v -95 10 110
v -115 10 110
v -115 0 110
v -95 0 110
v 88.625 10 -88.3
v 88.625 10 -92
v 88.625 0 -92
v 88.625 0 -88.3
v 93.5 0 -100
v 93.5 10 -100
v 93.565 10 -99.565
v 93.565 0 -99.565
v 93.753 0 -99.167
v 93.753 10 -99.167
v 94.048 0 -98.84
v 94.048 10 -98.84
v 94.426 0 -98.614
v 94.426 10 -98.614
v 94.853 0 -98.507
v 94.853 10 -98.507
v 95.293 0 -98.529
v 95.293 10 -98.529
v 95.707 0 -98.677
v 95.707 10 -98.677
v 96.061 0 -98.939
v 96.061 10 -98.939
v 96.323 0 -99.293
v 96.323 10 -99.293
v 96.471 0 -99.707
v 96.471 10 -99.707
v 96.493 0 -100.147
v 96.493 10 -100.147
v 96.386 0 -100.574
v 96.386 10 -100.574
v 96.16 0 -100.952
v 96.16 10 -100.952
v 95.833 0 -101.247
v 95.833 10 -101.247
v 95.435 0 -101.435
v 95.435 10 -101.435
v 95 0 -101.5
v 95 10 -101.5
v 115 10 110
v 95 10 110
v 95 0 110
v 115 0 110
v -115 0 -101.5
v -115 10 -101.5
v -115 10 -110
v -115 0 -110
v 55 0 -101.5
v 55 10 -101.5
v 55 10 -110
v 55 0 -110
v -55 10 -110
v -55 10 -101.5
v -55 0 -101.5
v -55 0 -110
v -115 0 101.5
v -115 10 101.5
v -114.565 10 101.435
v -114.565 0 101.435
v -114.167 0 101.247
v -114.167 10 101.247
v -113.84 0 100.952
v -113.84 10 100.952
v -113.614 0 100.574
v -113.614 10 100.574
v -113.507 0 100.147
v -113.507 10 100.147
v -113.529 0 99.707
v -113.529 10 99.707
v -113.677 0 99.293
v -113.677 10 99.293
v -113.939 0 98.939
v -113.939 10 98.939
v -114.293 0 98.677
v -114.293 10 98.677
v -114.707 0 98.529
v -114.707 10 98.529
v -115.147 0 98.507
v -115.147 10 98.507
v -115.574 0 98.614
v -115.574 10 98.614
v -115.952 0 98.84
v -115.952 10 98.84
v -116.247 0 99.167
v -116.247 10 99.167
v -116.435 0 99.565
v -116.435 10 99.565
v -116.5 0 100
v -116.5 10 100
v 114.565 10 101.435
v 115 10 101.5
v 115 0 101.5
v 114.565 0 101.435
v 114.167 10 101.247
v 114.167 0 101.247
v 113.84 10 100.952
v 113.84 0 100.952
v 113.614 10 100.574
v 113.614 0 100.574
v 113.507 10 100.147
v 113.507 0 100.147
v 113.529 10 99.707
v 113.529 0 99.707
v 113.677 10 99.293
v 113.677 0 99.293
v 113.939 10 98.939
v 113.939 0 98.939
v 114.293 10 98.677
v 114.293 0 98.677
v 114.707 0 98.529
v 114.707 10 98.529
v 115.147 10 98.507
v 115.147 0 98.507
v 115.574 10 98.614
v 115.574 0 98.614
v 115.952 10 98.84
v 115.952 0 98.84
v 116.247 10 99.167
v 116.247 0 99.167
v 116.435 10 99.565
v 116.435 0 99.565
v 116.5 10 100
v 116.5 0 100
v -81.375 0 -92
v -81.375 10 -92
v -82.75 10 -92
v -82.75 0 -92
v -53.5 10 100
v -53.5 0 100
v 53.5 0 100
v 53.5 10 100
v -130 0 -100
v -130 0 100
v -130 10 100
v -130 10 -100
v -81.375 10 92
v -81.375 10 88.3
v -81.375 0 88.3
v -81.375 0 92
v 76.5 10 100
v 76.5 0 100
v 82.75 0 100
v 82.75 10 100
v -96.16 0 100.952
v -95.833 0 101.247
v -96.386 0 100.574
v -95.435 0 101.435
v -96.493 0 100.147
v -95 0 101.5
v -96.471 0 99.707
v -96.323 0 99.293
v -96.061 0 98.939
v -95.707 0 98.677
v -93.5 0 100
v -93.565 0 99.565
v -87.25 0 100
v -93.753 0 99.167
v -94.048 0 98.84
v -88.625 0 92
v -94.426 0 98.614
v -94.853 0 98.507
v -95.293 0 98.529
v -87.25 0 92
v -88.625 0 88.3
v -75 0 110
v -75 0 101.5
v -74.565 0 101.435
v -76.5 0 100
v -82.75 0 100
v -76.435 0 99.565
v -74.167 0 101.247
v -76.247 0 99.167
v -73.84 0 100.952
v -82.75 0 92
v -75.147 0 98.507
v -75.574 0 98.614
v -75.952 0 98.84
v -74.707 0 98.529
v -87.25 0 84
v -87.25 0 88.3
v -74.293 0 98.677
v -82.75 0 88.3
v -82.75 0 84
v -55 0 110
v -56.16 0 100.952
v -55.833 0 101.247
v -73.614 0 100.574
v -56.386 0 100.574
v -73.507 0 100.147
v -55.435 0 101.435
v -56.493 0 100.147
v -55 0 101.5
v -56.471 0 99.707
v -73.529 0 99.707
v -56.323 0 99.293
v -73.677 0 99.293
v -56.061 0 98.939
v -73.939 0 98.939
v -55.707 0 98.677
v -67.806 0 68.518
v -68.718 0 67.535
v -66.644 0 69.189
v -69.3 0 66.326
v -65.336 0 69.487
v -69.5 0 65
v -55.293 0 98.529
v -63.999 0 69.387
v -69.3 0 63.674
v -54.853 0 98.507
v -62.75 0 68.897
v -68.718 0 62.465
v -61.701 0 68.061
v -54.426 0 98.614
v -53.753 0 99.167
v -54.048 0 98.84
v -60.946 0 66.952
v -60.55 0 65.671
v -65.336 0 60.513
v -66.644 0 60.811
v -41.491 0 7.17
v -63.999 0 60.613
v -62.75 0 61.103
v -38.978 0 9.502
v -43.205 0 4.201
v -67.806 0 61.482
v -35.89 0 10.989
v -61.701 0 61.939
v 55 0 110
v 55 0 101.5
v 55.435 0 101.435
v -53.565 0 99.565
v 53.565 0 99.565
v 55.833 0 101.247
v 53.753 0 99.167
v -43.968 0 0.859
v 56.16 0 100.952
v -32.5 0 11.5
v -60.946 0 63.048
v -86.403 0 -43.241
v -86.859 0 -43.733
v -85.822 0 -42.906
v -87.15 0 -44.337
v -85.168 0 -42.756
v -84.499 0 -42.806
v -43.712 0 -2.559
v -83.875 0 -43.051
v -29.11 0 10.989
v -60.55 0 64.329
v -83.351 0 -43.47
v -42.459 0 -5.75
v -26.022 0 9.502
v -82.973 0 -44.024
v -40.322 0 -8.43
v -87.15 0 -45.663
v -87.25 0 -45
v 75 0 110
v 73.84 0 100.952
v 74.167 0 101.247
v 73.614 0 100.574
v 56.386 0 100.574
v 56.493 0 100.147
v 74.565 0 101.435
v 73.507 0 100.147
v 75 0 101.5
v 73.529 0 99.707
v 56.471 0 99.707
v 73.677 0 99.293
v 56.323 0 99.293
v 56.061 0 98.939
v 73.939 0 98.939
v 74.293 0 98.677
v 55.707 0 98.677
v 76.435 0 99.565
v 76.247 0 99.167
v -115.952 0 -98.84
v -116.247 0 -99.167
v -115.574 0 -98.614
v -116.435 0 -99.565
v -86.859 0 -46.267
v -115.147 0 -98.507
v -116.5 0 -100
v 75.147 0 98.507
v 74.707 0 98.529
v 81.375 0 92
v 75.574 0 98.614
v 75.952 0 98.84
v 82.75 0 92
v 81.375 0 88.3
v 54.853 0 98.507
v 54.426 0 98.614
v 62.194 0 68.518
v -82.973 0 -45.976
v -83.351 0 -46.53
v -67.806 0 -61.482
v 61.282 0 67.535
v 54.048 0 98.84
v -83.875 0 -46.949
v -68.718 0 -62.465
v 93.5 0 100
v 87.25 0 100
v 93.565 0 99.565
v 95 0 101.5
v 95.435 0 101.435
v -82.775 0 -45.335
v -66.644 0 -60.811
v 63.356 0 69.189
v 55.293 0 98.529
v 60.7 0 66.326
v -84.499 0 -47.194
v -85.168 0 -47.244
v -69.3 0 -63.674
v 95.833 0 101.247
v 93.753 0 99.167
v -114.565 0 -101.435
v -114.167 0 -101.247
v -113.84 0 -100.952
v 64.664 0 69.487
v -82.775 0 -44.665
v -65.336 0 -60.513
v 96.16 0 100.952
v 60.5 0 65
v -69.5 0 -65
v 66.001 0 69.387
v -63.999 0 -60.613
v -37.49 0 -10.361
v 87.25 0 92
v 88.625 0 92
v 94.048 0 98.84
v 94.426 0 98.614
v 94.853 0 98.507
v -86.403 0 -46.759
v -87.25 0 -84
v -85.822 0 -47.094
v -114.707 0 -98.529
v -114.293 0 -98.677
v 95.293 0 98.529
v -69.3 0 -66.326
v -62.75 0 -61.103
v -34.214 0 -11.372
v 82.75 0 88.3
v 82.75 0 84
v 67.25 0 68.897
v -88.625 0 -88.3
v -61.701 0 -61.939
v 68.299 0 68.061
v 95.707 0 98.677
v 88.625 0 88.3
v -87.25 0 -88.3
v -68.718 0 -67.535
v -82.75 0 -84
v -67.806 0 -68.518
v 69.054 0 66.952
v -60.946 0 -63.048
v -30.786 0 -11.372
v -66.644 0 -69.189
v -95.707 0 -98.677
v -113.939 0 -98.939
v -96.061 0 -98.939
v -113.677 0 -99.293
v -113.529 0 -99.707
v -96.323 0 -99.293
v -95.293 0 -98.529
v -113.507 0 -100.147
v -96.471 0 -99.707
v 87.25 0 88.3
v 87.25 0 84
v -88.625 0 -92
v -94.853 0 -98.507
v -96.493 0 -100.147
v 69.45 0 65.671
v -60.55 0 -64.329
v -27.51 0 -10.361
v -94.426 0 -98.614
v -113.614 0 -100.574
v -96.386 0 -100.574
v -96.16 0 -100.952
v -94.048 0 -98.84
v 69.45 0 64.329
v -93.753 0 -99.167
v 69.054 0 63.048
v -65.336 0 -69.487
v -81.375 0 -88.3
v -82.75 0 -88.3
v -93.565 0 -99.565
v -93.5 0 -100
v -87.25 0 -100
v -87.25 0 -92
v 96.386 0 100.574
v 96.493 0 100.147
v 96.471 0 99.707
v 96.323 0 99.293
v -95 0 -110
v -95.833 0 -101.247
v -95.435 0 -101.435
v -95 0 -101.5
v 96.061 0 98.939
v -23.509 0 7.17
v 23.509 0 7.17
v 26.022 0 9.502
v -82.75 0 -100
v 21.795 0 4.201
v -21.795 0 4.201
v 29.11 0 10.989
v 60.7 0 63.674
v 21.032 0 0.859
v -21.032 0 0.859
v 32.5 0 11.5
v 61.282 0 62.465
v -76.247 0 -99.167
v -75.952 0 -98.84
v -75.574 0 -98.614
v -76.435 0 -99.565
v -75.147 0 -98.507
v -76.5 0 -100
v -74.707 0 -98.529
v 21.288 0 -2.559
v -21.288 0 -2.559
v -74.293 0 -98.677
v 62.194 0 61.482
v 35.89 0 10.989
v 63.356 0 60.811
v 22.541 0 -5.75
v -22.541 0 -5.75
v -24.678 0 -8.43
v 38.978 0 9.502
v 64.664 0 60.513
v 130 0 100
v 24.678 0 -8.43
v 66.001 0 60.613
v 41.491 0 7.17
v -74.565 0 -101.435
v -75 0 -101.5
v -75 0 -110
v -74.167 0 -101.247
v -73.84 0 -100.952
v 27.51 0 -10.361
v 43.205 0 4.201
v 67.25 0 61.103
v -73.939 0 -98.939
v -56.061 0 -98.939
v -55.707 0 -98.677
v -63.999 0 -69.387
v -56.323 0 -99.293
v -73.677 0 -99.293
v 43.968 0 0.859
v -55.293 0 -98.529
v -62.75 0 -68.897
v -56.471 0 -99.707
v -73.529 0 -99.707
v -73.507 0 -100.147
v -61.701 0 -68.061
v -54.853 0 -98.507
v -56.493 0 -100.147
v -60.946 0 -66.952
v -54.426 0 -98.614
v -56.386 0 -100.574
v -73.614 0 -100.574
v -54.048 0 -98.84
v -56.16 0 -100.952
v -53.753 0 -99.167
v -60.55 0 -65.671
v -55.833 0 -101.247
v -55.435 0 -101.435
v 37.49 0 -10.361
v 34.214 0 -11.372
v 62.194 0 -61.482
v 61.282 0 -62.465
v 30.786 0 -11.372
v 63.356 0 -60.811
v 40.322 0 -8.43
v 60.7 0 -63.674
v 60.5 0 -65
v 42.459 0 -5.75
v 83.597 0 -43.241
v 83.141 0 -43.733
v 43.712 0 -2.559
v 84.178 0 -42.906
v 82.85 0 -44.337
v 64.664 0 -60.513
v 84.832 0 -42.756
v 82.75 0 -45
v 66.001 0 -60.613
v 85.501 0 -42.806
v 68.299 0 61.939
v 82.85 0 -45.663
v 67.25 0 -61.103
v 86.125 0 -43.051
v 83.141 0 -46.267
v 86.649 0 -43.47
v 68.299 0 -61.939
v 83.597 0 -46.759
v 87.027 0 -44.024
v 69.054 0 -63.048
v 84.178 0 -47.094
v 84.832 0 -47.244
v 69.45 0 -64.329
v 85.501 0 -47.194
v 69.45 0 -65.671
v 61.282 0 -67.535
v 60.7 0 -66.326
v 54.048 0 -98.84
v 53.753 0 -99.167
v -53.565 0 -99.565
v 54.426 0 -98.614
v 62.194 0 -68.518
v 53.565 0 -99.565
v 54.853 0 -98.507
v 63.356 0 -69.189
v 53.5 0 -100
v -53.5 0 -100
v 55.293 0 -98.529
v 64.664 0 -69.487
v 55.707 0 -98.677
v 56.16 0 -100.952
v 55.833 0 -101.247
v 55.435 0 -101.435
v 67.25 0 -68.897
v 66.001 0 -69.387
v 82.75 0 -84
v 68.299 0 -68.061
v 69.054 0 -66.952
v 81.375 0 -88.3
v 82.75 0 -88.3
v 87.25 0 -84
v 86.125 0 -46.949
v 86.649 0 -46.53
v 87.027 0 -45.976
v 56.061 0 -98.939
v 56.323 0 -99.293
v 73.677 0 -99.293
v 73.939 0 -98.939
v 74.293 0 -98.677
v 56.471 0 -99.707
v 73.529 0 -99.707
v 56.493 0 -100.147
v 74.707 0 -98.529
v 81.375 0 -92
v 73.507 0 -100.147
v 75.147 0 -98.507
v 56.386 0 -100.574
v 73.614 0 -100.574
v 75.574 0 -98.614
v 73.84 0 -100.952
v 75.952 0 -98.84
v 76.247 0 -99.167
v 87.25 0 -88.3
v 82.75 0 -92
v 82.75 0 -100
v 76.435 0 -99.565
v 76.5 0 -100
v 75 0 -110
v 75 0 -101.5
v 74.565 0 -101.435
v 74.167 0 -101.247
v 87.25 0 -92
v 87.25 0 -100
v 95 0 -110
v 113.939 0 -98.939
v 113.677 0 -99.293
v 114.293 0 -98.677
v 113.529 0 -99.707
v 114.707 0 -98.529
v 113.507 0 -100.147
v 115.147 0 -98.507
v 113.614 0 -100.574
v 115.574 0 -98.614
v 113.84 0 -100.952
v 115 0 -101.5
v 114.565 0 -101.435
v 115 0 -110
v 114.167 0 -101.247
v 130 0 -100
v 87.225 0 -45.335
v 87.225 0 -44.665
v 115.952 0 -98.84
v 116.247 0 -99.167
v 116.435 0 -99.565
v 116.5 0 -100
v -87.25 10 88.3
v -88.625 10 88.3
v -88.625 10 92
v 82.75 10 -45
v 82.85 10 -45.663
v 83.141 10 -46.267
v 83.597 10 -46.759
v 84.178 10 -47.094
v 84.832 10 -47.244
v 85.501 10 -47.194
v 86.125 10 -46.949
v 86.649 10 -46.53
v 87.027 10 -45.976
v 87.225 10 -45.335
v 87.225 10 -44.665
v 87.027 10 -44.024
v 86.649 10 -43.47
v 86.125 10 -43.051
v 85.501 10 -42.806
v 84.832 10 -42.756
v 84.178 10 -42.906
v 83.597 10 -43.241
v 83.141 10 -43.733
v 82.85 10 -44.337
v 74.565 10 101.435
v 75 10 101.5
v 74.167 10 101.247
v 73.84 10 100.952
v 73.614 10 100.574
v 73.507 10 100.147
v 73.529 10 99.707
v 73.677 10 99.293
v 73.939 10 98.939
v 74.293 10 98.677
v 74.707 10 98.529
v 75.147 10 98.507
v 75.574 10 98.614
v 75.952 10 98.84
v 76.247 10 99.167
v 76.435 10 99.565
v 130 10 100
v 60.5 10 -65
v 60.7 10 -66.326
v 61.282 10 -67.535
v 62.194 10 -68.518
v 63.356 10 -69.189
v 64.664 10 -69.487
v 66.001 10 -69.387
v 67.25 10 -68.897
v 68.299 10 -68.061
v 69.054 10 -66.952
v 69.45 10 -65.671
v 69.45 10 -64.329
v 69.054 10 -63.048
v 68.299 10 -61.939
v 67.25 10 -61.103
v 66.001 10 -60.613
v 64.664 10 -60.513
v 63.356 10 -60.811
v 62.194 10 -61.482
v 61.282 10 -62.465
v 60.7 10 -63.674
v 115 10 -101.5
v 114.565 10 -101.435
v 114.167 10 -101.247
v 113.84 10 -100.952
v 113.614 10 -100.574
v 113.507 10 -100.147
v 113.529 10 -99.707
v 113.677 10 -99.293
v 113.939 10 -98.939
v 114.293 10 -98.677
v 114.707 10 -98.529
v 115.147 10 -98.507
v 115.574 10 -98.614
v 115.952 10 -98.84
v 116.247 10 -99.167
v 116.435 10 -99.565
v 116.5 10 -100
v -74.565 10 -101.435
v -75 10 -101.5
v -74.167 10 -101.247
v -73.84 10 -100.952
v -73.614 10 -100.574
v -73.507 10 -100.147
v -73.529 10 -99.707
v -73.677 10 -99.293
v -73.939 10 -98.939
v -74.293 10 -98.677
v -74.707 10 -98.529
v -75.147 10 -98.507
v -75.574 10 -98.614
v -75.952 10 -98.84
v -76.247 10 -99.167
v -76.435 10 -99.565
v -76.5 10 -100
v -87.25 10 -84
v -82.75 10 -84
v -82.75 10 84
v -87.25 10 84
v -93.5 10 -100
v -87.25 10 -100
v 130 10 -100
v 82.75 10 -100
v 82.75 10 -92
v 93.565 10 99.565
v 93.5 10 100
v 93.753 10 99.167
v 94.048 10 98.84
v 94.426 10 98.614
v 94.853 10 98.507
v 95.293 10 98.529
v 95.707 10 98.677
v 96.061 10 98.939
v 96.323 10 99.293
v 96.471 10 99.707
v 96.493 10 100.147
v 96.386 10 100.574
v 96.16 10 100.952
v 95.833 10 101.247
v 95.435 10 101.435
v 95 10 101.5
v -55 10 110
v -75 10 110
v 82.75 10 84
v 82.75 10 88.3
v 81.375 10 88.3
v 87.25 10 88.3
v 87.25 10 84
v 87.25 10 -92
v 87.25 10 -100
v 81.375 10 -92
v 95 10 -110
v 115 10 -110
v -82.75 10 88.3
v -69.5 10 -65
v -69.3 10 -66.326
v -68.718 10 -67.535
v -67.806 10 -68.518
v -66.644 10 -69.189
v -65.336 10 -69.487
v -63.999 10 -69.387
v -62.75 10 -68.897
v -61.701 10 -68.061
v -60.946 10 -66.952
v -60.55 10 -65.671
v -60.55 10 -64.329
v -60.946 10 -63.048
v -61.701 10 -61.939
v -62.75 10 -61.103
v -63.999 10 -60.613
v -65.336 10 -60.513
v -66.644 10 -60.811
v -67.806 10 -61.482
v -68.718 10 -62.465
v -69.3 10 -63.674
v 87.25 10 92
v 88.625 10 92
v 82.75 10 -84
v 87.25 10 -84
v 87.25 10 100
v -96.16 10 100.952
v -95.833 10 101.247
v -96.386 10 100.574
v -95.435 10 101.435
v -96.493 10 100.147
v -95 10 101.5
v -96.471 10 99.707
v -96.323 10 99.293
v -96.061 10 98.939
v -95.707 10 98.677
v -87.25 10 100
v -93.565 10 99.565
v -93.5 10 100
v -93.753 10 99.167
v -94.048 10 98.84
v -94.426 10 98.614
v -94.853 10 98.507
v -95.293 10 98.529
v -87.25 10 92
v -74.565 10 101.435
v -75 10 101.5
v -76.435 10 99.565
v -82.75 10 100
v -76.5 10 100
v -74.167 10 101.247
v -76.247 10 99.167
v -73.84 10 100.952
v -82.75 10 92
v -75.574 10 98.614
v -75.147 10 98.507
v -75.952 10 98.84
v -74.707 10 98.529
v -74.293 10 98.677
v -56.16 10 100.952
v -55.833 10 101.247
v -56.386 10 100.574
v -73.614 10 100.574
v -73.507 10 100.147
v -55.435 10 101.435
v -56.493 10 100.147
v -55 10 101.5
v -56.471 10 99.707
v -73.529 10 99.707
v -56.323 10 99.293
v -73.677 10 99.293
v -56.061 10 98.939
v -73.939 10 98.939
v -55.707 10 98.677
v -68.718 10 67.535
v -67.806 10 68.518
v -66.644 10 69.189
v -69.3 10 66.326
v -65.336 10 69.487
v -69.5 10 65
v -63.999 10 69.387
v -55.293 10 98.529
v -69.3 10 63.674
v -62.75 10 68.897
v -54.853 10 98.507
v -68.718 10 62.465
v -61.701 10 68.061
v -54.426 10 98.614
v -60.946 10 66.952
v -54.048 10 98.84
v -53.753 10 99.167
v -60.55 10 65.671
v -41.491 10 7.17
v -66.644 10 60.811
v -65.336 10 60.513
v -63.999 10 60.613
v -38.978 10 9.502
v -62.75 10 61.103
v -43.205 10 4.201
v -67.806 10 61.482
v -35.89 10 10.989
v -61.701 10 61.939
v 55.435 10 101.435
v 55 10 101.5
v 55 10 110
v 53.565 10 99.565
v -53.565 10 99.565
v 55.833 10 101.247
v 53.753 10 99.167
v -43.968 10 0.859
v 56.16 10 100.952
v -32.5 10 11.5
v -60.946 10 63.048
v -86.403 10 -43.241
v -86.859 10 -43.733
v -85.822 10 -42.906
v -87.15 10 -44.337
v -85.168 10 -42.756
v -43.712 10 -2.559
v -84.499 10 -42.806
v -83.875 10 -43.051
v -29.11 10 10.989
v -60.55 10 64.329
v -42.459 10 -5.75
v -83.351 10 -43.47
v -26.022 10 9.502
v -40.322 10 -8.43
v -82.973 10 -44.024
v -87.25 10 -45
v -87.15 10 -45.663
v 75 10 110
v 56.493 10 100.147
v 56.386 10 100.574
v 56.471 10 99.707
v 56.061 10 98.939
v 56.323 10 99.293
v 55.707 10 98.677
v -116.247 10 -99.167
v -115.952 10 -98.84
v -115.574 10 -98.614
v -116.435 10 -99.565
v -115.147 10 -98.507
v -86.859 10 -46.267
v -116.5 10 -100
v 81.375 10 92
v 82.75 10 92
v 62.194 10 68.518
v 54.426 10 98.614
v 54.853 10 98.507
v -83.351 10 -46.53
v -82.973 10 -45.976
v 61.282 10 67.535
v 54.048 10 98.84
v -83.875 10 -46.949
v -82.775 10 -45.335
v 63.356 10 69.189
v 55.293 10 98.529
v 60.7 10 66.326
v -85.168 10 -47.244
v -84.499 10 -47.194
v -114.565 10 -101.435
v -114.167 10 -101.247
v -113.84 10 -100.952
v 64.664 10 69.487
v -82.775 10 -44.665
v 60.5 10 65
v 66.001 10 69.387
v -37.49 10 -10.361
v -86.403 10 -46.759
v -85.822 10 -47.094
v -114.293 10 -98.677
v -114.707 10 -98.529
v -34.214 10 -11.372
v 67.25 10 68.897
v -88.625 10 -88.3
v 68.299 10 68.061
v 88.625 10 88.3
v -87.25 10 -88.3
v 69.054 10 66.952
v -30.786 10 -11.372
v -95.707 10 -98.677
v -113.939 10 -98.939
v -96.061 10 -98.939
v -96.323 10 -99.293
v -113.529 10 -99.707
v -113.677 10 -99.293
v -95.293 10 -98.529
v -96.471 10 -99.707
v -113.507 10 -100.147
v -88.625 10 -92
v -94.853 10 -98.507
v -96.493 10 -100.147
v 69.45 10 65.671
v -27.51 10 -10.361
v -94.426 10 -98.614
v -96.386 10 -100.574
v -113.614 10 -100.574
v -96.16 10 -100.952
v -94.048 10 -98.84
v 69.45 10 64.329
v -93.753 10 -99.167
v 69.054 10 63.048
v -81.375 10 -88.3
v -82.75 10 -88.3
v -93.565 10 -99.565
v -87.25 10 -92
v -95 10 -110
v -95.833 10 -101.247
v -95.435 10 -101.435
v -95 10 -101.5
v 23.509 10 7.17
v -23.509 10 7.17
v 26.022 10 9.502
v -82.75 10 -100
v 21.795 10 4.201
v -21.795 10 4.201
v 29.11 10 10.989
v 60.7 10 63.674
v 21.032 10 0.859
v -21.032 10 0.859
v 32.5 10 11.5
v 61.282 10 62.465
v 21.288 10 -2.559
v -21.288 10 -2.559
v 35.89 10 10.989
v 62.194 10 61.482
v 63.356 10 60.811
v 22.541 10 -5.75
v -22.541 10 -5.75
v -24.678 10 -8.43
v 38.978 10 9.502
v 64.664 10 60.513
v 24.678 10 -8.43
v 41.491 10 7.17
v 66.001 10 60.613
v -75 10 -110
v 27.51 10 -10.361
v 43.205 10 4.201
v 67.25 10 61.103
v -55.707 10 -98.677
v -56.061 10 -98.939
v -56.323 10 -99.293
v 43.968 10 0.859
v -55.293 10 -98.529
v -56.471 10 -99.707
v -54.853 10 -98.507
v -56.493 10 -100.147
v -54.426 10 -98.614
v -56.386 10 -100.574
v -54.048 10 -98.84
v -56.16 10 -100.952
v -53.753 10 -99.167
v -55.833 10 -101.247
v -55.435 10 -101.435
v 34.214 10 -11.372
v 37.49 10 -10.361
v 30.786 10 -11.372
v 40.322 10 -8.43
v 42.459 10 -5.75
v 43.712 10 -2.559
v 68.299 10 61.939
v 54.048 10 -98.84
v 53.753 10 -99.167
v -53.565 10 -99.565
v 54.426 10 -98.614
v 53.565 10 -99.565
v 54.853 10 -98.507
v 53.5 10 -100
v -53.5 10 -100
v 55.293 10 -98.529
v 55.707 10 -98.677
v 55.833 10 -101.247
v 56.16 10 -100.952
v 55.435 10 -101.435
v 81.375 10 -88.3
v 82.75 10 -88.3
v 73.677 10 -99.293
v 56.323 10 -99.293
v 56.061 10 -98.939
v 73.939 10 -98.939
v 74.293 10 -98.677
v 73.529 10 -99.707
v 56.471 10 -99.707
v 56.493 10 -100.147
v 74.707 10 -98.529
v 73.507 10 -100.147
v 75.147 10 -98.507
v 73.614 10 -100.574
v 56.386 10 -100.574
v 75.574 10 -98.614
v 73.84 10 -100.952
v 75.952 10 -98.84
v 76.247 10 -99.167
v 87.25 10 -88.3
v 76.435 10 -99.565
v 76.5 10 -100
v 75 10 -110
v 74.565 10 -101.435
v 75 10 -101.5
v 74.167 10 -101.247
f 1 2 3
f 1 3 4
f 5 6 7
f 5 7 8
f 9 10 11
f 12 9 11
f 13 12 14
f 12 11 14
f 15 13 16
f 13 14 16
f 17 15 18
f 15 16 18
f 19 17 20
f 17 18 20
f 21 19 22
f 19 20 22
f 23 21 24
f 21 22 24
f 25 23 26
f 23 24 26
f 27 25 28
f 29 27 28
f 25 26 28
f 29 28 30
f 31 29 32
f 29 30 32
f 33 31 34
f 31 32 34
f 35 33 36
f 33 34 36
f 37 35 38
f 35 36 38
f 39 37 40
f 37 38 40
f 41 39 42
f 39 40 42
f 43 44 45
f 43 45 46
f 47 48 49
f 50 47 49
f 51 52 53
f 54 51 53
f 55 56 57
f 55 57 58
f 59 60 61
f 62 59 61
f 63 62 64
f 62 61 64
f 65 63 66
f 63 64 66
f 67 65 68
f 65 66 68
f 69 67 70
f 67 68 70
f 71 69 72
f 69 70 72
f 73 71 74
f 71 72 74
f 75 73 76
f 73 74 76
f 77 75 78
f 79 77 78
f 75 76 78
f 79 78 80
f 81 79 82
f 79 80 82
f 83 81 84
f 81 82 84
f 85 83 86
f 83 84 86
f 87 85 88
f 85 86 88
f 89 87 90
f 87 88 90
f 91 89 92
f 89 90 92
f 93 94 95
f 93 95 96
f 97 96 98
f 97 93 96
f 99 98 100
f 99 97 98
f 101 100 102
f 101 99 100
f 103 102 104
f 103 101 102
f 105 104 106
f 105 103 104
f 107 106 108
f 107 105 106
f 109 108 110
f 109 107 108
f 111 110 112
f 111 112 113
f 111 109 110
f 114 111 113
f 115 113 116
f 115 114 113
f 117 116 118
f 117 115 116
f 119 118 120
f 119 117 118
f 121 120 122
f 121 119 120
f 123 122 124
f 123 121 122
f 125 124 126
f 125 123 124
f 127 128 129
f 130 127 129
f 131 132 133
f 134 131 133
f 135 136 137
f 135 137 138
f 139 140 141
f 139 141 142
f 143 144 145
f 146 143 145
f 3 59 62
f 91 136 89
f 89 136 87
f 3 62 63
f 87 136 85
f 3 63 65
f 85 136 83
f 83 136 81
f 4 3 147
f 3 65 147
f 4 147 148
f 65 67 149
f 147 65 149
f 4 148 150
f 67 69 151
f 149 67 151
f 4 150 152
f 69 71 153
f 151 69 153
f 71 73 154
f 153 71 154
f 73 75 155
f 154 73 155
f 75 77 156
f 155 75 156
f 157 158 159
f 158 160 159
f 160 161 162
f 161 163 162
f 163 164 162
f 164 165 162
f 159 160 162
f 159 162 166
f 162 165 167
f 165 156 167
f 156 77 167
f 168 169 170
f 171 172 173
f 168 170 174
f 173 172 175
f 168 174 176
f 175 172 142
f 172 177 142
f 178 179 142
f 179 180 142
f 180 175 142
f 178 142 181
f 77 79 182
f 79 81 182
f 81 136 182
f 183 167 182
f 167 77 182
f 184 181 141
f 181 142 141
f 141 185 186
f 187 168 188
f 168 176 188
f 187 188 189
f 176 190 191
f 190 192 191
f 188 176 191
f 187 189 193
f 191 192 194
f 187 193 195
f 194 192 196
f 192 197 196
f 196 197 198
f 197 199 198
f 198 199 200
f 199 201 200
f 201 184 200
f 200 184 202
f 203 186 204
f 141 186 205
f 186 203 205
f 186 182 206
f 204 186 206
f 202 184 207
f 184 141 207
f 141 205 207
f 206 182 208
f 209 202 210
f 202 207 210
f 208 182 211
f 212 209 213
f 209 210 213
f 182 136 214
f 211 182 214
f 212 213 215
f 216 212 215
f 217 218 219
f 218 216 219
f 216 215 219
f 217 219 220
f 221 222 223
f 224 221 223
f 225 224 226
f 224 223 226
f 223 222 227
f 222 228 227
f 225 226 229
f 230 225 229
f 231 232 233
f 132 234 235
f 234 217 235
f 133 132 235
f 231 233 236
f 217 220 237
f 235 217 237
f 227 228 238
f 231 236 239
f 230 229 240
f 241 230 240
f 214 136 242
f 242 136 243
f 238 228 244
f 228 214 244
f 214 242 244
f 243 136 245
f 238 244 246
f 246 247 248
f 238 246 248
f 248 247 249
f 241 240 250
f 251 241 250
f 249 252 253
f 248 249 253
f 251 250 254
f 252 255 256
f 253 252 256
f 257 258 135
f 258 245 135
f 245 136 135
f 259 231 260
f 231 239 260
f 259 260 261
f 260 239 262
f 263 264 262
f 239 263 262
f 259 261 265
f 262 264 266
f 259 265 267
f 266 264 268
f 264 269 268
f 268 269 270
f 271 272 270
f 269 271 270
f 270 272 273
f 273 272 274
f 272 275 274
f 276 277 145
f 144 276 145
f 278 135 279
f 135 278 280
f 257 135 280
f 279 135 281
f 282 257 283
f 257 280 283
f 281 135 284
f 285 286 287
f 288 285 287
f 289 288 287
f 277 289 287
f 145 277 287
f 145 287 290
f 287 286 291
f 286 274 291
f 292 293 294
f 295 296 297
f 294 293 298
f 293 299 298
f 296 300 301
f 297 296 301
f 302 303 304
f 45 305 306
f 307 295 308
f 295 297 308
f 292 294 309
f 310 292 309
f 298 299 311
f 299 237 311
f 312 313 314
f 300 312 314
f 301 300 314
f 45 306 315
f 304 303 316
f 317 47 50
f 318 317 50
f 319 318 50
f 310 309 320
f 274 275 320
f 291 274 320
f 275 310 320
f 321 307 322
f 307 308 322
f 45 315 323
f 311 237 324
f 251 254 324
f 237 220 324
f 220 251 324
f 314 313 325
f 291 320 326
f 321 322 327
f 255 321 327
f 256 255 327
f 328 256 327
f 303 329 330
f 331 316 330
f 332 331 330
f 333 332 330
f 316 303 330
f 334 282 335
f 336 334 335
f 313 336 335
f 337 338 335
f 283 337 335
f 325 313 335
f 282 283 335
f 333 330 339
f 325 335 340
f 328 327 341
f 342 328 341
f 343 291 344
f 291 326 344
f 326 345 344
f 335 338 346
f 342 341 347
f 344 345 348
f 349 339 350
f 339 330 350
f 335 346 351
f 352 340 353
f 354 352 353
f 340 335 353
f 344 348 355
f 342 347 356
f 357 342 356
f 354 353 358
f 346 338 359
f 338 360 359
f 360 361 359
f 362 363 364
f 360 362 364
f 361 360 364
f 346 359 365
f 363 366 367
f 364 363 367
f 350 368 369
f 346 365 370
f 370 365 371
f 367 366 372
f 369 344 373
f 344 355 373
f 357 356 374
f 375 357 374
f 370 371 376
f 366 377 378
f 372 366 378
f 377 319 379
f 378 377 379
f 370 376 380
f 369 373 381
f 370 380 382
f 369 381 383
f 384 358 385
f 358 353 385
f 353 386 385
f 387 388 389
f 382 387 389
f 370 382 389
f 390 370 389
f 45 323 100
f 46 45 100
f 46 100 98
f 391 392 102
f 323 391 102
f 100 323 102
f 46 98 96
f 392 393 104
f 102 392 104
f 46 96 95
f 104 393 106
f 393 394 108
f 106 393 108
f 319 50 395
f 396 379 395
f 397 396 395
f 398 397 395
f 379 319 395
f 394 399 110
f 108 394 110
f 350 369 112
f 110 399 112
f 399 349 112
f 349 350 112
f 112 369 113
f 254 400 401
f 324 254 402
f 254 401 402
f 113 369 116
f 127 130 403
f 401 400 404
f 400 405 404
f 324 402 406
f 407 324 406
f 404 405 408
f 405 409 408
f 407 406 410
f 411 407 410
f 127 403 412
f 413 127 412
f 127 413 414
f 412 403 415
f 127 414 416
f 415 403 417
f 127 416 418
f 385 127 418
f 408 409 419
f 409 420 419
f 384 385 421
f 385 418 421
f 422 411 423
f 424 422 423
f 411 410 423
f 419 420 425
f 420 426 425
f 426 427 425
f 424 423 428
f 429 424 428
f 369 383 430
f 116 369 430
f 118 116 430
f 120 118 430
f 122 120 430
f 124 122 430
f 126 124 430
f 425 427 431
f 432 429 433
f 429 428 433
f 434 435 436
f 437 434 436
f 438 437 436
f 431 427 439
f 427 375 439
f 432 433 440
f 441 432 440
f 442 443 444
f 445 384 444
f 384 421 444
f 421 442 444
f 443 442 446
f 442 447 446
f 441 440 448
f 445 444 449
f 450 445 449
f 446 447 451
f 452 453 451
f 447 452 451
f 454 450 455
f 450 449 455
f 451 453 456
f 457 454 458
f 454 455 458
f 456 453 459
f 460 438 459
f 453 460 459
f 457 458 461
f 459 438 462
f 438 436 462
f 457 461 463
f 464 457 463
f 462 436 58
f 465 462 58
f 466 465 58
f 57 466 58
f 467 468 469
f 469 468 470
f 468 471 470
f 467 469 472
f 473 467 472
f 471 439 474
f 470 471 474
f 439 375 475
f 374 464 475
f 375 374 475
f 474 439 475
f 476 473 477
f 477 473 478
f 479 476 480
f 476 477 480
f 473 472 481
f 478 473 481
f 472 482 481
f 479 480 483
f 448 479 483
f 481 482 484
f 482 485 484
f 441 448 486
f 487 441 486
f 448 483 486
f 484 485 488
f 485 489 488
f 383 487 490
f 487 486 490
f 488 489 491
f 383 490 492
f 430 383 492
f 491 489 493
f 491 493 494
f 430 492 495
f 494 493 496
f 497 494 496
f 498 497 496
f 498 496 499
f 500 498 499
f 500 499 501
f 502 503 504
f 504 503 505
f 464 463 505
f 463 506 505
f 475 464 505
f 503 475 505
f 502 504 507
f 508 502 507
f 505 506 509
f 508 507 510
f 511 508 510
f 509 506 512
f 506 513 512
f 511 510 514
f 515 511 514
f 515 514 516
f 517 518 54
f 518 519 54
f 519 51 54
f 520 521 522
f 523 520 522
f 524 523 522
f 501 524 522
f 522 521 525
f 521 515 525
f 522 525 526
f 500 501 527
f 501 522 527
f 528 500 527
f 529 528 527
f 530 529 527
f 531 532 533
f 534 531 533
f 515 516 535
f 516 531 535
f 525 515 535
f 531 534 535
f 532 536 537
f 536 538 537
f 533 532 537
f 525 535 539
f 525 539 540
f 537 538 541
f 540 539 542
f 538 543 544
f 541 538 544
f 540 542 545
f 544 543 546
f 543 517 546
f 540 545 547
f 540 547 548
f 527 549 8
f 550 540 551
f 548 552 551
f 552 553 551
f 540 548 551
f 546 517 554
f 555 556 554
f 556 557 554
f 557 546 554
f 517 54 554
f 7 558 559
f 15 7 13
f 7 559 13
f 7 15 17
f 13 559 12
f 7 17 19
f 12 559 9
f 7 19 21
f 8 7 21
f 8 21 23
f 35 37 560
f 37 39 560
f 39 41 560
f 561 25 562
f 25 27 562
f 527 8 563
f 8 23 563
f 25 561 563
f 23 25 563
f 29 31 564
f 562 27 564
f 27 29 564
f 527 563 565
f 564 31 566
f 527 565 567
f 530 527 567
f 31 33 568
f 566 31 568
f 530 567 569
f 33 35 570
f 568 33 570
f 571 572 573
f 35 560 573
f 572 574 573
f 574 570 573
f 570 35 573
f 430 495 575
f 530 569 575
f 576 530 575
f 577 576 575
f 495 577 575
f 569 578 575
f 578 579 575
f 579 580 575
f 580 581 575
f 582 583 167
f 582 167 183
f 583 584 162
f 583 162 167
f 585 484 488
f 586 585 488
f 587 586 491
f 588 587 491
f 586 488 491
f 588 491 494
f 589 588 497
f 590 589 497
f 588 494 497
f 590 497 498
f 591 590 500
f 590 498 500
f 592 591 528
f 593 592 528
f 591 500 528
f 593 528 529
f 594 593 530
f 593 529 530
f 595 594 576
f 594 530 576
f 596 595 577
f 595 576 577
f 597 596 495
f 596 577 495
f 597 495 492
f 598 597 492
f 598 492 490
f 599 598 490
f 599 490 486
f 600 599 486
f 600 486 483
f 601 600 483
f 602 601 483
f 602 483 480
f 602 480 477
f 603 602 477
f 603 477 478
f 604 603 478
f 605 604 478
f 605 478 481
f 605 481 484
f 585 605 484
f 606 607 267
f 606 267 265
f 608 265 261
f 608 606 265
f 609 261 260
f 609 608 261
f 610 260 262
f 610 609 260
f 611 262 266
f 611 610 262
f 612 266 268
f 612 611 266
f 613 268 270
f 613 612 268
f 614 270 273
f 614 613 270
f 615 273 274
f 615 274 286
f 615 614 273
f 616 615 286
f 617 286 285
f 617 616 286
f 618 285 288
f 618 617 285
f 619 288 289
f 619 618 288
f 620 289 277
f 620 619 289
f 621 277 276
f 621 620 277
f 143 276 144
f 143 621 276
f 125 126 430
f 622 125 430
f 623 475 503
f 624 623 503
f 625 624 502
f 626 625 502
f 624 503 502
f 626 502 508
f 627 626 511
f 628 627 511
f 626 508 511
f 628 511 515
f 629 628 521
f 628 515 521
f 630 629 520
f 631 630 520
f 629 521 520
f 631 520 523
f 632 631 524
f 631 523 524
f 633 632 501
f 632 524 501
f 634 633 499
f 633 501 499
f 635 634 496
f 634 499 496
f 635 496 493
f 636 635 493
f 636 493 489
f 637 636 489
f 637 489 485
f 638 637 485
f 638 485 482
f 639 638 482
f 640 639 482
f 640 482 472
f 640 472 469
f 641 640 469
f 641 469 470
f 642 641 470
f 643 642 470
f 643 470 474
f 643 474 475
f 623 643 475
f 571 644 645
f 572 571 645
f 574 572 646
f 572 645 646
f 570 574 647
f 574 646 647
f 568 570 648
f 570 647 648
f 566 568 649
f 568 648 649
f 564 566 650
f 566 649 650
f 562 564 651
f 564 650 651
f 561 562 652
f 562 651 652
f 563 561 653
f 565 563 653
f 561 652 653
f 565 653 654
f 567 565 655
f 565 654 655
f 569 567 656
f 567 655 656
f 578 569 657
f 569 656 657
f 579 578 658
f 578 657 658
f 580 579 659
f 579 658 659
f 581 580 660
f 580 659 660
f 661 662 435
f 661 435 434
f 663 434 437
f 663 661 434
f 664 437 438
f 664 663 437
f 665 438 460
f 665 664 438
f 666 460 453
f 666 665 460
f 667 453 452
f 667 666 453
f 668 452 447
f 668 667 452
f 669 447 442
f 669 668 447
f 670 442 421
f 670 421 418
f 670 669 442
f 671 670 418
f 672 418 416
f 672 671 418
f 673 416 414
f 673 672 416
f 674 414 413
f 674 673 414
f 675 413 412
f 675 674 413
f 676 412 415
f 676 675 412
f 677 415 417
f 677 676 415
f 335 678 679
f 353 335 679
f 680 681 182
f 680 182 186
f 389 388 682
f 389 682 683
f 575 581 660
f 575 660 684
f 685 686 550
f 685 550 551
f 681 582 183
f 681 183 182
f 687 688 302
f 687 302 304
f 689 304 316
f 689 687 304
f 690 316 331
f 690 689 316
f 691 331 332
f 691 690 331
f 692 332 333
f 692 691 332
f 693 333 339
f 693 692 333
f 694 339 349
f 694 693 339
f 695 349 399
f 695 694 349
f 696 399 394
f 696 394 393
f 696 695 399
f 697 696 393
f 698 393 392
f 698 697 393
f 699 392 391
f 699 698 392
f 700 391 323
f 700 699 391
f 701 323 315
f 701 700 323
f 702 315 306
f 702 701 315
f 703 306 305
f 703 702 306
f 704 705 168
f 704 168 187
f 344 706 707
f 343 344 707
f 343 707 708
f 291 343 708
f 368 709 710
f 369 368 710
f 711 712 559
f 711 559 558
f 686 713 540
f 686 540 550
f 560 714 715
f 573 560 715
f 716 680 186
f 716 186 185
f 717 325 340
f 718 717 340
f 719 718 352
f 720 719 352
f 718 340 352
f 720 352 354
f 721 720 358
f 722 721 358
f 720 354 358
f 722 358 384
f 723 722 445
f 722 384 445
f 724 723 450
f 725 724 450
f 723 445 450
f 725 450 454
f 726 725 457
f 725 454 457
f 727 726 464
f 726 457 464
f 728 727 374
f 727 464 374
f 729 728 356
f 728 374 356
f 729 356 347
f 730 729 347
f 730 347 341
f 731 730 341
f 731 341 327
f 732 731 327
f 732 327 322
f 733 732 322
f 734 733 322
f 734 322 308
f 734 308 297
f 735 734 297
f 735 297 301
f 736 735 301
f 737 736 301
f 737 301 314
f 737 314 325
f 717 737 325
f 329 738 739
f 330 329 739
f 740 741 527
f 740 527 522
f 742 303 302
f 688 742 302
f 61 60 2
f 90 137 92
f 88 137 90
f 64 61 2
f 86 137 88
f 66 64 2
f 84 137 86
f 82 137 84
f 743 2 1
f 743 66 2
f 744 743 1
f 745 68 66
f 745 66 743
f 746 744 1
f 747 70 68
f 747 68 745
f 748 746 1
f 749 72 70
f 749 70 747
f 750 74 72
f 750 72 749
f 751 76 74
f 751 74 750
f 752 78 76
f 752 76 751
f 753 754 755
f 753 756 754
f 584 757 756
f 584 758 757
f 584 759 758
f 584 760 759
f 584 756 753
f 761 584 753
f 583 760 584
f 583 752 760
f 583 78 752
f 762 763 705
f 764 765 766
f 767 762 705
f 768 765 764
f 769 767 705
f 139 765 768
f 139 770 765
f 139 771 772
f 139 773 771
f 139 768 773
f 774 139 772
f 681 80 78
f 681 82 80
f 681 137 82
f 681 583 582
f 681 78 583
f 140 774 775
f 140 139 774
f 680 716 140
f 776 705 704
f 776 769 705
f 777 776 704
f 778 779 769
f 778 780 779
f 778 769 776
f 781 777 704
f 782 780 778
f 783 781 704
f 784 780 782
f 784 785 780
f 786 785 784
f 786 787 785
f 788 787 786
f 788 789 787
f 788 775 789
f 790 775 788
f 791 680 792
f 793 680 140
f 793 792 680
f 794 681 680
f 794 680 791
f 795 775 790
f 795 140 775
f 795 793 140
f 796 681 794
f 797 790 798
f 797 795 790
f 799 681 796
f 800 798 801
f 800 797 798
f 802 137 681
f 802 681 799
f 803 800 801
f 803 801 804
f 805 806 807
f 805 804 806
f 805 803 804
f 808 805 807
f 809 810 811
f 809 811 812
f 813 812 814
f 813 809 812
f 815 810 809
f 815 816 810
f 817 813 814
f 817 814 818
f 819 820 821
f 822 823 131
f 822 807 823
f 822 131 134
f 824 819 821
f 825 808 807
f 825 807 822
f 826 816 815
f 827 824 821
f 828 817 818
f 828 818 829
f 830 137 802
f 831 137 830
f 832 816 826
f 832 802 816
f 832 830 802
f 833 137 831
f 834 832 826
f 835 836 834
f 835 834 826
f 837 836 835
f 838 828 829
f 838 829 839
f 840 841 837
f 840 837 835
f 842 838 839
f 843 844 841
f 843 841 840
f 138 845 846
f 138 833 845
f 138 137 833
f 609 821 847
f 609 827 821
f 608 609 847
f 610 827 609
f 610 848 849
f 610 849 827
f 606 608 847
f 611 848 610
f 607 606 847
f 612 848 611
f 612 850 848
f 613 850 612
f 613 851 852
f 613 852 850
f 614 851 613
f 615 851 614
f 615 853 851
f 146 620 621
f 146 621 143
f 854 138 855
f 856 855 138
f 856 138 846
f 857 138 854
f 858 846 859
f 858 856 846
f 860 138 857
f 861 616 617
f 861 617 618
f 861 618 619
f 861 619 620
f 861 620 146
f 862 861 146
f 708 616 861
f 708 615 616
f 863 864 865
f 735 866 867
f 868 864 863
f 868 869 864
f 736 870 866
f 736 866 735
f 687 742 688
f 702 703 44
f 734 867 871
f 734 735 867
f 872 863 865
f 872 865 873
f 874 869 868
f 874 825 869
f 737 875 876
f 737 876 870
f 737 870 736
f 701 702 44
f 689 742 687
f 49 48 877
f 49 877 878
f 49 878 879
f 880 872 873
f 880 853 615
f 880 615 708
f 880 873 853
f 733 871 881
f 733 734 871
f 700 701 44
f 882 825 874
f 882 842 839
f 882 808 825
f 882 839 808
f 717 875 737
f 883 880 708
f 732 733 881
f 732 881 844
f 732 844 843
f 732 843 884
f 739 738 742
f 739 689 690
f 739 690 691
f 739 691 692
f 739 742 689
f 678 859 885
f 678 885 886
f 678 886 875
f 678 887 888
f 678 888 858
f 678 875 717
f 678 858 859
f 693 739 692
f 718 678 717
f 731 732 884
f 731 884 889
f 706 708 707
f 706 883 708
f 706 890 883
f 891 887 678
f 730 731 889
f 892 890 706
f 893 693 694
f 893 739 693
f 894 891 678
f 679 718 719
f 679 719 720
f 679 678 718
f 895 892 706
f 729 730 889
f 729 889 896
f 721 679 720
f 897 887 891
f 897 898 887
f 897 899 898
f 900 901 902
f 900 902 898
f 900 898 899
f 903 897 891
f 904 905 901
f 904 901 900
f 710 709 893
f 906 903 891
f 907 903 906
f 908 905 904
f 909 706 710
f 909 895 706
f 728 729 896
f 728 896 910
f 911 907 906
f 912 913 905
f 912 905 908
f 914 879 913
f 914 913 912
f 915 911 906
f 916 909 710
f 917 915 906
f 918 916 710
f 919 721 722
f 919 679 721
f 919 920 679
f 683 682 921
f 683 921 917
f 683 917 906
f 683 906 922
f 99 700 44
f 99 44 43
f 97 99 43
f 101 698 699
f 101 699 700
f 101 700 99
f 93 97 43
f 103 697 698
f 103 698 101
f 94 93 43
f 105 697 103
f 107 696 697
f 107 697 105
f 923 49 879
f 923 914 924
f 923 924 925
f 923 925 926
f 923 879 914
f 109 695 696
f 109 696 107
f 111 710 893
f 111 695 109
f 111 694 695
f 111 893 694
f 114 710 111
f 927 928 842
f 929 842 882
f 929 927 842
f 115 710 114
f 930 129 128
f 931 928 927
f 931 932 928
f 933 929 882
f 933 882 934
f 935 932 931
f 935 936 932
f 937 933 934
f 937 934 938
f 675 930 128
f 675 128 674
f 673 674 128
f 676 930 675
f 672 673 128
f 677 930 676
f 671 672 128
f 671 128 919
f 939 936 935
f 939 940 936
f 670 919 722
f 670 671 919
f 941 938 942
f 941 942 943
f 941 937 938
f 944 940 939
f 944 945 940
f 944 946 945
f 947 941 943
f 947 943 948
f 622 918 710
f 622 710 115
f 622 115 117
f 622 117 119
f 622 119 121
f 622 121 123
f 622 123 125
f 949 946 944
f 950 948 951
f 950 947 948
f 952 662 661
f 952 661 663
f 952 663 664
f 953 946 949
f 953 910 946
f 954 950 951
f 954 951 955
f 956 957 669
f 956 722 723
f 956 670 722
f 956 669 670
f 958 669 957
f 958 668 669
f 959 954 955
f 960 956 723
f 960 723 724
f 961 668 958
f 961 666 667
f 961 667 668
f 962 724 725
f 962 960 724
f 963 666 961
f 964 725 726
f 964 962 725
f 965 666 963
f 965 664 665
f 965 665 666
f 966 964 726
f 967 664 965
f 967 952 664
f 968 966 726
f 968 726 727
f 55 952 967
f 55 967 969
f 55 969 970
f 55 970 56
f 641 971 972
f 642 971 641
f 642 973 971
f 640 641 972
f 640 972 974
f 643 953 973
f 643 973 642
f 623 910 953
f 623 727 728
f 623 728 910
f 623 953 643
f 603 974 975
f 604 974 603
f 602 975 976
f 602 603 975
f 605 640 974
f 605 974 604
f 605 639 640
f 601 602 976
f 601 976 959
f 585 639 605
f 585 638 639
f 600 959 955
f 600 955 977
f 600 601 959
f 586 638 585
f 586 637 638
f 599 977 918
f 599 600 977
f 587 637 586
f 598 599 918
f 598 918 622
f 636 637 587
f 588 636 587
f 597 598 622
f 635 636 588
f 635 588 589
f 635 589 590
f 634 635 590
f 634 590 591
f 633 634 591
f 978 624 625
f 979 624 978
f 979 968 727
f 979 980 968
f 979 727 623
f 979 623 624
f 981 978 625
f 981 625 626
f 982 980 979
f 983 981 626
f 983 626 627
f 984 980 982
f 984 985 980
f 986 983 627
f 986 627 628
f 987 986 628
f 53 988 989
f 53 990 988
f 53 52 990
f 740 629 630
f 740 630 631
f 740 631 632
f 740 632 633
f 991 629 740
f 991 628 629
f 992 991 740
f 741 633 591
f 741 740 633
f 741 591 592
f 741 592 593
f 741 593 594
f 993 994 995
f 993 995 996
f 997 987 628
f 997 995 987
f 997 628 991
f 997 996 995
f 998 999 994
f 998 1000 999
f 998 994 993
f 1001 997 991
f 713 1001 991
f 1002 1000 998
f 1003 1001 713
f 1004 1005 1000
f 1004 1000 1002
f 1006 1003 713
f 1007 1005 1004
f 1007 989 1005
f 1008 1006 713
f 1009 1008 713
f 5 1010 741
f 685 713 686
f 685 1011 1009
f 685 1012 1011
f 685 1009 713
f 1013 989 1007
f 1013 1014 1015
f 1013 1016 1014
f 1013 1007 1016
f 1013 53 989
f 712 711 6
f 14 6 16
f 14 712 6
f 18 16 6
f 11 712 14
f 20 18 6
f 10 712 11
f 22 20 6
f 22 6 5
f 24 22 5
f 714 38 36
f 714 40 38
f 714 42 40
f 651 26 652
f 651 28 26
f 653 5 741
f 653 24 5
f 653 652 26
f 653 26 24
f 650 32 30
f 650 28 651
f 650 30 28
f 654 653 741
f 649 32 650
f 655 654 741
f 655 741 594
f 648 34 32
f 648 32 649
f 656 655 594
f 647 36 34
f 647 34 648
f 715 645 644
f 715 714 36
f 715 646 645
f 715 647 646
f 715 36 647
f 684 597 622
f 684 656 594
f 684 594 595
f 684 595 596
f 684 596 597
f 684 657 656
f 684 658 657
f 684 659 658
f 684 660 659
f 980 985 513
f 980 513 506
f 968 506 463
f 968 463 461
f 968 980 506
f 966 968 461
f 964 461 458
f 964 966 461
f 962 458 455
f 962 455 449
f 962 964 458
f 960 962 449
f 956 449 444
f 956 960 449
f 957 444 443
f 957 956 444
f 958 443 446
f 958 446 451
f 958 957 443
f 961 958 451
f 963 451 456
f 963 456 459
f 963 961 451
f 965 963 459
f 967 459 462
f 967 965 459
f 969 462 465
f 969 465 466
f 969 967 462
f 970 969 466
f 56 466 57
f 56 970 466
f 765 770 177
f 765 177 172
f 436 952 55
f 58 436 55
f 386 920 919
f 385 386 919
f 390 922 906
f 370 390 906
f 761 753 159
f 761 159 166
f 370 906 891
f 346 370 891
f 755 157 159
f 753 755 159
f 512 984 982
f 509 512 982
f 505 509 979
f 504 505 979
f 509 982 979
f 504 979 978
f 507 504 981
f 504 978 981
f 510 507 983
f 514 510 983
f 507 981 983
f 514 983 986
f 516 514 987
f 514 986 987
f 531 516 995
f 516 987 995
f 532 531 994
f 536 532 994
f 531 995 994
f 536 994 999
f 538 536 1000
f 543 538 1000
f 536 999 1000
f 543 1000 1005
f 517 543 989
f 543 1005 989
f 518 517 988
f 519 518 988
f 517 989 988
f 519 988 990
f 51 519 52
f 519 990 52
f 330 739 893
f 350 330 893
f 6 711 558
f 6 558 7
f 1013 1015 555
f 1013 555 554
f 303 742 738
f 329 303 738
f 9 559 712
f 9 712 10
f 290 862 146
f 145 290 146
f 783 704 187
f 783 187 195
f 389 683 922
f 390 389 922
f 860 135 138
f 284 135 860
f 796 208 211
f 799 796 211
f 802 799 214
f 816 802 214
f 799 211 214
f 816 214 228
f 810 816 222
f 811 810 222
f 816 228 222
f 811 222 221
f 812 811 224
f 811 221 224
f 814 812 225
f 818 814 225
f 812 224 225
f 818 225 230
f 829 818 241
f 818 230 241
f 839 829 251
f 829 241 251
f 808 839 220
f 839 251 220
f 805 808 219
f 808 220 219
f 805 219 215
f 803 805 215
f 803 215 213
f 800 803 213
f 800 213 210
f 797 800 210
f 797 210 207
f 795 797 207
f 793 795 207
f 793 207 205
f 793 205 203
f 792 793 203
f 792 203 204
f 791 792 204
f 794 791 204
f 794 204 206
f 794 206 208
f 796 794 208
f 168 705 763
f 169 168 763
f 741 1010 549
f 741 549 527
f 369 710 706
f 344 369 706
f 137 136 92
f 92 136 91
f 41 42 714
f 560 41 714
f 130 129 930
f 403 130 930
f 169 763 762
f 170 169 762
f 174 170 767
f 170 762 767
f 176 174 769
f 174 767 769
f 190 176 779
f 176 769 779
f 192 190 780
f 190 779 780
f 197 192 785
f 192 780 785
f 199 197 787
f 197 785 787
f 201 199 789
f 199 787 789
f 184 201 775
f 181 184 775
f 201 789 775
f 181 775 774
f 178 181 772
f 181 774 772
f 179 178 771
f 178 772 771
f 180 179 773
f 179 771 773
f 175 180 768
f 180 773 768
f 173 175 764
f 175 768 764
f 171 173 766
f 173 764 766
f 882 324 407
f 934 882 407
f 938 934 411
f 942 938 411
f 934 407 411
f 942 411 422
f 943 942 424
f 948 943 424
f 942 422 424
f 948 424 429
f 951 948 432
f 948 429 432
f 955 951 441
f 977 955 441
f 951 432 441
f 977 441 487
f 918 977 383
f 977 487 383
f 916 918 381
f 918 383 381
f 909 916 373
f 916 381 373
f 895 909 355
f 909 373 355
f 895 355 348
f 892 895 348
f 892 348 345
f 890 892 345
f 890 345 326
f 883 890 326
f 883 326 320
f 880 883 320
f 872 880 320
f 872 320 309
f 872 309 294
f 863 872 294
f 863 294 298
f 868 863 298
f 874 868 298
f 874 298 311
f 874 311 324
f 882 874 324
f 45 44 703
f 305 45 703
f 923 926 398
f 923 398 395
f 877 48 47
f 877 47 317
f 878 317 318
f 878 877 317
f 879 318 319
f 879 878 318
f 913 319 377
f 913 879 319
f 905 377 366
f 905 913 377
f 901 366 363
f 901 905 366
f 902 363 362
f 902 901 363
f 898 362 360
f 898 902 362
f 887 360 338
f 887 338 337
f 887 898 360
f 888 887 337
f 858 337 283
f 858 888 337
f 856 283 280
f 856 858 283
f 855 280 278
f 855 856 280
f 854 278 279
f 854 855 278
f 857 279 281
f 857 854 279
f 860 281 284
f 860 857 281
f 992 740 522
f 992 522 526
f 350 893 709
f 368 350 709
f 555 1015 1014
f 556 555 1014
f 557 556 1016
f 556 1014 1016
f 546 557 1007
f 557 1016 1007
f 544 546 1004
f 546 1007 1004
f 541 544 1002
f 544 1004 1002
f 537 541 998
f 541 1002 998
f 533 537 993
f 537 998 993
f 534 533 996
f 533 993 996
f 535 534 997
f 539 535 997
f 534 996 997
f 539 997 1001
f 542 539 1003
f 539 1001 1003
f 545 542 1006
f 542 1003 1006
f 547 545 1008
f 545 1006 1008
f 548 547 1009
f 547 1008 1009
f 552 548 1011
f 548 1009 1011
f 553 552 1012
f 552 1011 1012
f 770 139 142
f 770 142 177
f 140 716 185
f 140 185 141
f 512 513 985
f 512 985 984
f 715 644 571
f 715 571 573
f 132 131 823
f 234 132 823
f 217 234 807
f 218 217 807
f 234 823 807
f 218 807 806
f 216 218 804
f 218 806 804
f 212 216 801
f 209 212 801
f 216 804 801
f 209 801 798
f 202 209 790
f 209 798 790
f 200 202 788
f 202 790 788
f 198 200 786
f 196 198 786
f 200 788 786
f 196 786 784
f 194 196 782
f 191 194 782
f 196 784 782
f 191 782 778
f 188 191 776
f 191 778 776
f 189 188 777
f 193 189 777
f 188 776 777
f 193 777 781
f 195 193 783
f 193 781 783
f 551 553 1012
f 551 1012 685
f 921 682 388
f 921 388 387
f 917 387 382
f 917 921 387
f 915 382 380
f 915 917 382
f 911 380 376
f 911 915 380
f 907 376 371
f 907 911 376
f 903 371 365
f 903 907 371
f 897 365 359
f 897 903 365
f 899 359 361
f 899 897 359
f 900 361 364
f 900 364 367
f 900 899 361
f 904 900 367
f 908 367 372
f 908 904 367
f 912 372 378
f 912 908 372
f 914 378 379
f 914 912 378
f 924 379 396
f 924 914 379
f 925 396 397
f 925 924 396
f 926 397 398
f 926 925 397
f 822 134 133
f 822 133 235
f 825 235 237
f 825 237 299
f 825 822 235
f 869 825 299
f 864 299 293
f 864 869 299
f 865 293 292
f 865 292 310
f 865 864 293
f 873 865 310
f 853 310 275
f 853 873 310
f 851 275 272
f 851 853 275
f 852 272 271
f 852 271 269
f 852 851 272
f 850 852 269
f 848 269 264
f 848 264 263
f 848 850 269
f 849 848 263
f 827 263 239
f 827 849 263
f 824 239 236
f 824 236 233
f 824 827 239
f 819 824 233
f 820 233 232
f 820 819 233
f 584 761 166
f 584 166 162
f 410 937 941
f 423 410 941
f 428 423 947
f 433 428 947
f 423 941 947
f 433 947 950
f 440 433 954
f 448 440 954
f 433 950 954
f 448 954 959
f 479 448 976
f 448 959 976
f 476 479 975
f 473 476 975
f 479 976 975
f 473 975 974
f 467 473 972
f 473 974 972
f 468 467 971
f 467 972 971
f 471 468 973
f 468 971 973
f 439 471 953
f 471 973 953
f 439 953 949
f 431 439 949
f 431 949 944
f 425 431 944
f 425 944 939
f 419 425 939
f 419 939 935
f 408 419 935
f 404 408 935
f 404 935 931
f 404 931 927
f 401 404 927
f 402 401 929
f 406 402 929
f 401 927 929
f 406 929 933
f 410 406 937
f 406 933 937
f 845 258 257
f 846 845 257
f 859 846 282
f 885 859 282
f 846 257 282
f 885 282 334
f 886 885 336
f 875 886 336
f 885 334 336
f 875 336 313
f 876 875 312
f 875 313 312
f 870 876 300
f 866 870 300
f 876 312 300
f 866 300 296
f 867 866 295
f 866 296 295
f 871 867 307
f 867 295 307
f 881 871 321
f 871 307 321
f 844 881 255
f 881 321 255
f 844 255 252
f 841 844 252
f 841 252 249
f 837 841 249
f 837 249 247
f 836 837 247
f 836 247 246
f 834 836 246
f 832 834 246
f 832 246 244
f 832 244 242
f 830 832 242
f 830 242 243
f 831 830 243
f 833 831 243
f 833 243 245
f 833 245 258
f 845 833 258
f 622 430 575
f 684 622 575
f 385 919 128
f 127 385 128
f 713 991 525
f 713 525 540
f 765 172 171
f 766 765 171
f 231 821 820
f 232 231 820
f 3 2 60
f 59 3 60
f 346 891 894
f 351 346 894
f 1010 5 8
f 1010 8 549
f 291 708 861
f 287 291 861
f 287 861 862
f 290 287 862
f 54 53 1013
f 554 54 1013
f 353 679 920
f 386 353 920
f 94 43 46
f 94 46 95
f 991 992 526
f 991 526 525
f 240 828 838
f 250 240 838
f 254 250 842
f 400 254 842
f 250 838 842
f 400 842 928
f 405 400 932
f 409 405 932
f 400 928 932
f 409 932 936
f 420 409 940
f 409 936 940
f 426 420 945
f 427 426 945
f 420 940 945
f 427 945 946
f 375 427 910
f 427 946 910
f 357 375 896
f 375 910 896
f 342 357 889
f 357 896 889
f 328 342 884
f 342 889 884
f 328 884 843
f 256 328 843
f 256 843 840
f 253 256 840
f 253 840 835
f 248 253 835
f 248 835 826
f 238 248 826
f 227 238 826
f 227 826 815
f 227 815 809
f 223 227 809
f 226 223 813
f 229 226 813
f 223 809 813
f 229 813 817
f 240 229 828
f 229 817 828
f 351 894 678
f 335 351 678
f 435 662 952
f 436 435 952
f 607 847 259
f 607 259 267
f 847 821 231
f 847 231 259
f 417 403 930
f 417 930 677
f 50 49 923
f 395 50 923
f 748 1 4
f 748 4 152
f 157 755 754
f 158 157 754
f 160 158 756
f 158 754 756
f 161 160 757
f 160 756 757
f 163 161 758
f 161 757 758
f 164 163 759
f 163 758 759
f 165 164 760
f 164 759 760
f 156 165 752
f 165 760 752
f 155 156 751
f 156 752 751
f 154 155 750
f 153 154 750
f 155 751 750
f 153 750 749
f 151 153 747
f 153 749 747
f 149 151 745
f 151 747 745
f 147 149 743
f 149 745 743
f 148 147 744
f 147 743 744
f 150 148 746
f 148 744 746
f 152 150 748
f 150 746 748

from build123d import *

# Parameters (mm, degrees)
SKETCH1_W            = 260
SKETCH1_H            = 200
EXTRUDE1_DEPTH       = 10
M4_CLEARANCE_HOLE1_D = 4.5
SKETCH7_W            = 20
SKETCH7_H            = 10
EXTRUDE4_DEPTH       = 10
LPATTERN1_COUNT      = 2
LPATTERN1_PITCH      = 170
LPATTERN1_COUNT_DIR2 = 2
LPATTERN1_PITCH_DIR2 = 210
EXTRUDE5_DEPTH       = 10
MIRROR5_COPY_1_DEPTH = 10
EXTRUDE6_DEPTH       = 10
MIRROR7_COPY_1_DEPTH = 10
SKETCH10_R           = 11.5
EXTRUDE7_DEPTH       = 10
M8_CLEARANCE_HOLE1_D = 9


with BuildPart() as part:
    # Sketch1 → Extrude1 (new body)
    with BuildSketch(Plane(origin=(0, 0, 0), x_dir=(1, 0, 0), z_dir=(0, 1, 0))):
        Rectangle(SKETCH1_W, SKETCH1_H)
    extrude(amount=EXTRUDE1_DEPTH)

    # M4 Clearance Hole1 (through all)
    with Locations(Plane(origin=(0, 10, 0), x_dir=(1, 0, 0), z_dir=(0, 1, 0))):
        with Locations((-85, 45), (85, 45)):
            Hole(M4_CLEARANCE_HOLE1_D / 2)

    # Sketch7 → Extrude4 (add)
    with BuildSketch(Plane(origin=(0, 10, 0), x_dir=(1, 0, 0), z_dir=(0, 1, 0))):
        with Locations((-105, -105)):
            Rectangle(SKETCH7_W, SKETCH7_H)
        with Locations((-65, -105)):
            Rectangle(SKETCH7_W, SKETCH7_H)
    extrude4 = extrude(amount=-EXTRUDE4_DEPTH)

    # LPattern1: Extrude4 2 × 2
    with Locations(*[(i * LPATTERN1_PITCH, 0, -j * LPATTERN1_PITCH_DIR2) for i in range(LPATTERN1_COUNT) for j in range(LPATTERN1_COUNT_DIR2) if (i, j) != (0, 0)]):
        add(extrude4)

    # Sketch8 → Extrude5 (cut)
    with BuildSketch(Plane(origin=(0, 10, 0), x_dir=(1, 0, 0), z_dir=(0, 1, 0))):
        with BuildLine():
            Line((-116.5, -100), (-115, -100))
            Line((-115, -100), (-115, -101.5))
            ThreePointArc((-115, -101.5), (-113.939339828, -98.939339828), (-116.5, -100))
        make_face()
        with BuildLine():
            Line((-95, -101.5), (-95, -100))
            Line((-95, -100), (-93.5, -100))
            ThreePointArc((-93.5, -100), (-96.060660172, -98.939339828), (-95, -101.5))
        make_face()
        with BuildLine():
            Line((-75, -100), (-75, -101.5))
            ThreePointArc((-75, -101.5), (-73.939339828, -98.939339828), (-76.5, -100))
            Line((-76.5, -100), (-75, -100))
        make_face()
        with BuildLine():
            Line((-55, -101.5), (-55, -100))
            Line((-55, -100), (-53.5, -100))
            ThreePointArc((-53.5, -100), (-56.060660172, -98.939339828), (-55, -101.5))
        make_face()
    extrude5 = extrude(amount=-EXTRUDE5_DEPTH, mode=Mode.SUBTRACT)

    # Mirror4: Extrude5 across plane
    add(extrude5.mirror(Plane(origin=(0, 0, 0), x_dir=(0, 0, 1), z_dir=(1, 0, 0))), mode=Mode.SUBTRACT)

    # Mirror5: Extrude5 across plane
    add(extrude5.mirror(Plane.XY), mode=Mode.SUBTRACT)

    # Mirror5 copy 1 sketch → Mirror5 copy 1 (cut)
    with BuildSketch(Plane(origin=(0, 10, 0), x_dir=(-1, 0, 0), z_dir=(0, 1, 0))):
        with BuildLine():
            Line((-116.5, -100), (-115, -100))
            Line((-115, -100), (-115, -101.5))
            ThreePointArc((-115, -101.5), (-113.939339828, -98.939339828), (-116.5, -100))
        make_face()
        with BuildLine():
            Line((-95, -101.5), (-95, -100))
            Line((-95, -100), (-93.5, -100))
            ThreePointArc((-93.5, -100), (-96.060660172, -98.939339828), (-95, -101.5))
        make_face()
        with BuildLine():
            Line((-75, -100), (-75, -101.5))
            ThreePointArc((-75, -101.5), (-73.939339828, -98.939339828), (-76.5, -100))
            Line((-76.5, -100), (-75, -100))
        make_face()
        with BuildLine():
            Line((-55, -101.5), (-55, -100))
            Line((-55, -100), (-53.5, -100))
            ThreePointArc((-53.5, -100), (-56.060660172, -98.939339828), (-55, -101.5))
        make_face()
    extrude(amount=-MIRROR5_COPY_1_DEPTH, mode=Mode.SUBTRACT)

    # Sketch9 → Extrude6 (cut)
    with BuildSketch(Plane(origin=(0, 10, 0), x_dir=(1, 0, 0), z_dir=(0, 1, 0))):
        Polygon((-87.25, -100), (-87.25, -92), (-88.625, -92), (-88.625, -88.3), (-87.25, -88.3), (-87.25, -84), (-82.75, -84), (-82.75, -88.3), (-81.375, -88.3), (-81.375, -92), (-82.75, -92), (-82.75, -100), align=None)
    extrude6 = extrude(amount=-EXTRUDE6_DEPTH, mode=Mode.SUBTRACT)

    # Mirror6: Extrude6 across plane
    add(extrude6.mirror(Plane(origin=(0, 0, 0), x_dir=(0, 0, 1), z_dir=(1, 0, 0))), mode=Mode.SUBTRACT)

    # Mirror7: Extrude6 across plane
    add(extrude6.mirror(Plane.XY), mode=Mode.SUBTRACT)

    # Mirror7 copy 1 sketch → Mirror7 copy 1 (cut)
    with BuildSketch(Plane(origin=(0, 10, 0), x_dir=(-1, 0, 0), z_dir=(0, 1, 0))):
        Polygon((-87.25, -100), (-87.25, -92), (-88.625, -92), (-88.625, -88.3), (-87.25, -88.3), (-87.25, -84), (-82.75, -84), (-82.75, -88.3), (-81.375, -88.3), (-81.375, -92), (-82.75, -92), (-82.75, -100), align=None)
    extrude(amount=-MIRROR7_COPY_1_DEPTH, mode=Mode.SUBTRACT)

    # Sketch10 → Extrude7 (cut)
    with BuildSketch(Plane(origin=(0, 10, 0), x_dir=(1, 0, 0), z_dir=(0, 1, 0))):
        with Locations(Location((-32.5, 0, 0), (0, 0, 270))):
            Circle(SKETCH10_R)
        with Locations(Location((32.5, 0, 0), (0, 0, 270))):
            Circle(SKETCH10_R)
    extrude(amount=-EXTRUDE7_DEPTH, mode=Mode.SUBTRACT)

    # M8 Clearance Hole1 (through all)
    with Locations(Plane(origin=(0, 10, 0), x_dir=(1, 0, 0), z_dir=(0, 1, 0))):
        with Locations((-65, 65), (65, 65), (65, -65), (-65, -65)):
            Hole(M8_CLEARANCE_HOLE1_D / 2)


solid = part.part
